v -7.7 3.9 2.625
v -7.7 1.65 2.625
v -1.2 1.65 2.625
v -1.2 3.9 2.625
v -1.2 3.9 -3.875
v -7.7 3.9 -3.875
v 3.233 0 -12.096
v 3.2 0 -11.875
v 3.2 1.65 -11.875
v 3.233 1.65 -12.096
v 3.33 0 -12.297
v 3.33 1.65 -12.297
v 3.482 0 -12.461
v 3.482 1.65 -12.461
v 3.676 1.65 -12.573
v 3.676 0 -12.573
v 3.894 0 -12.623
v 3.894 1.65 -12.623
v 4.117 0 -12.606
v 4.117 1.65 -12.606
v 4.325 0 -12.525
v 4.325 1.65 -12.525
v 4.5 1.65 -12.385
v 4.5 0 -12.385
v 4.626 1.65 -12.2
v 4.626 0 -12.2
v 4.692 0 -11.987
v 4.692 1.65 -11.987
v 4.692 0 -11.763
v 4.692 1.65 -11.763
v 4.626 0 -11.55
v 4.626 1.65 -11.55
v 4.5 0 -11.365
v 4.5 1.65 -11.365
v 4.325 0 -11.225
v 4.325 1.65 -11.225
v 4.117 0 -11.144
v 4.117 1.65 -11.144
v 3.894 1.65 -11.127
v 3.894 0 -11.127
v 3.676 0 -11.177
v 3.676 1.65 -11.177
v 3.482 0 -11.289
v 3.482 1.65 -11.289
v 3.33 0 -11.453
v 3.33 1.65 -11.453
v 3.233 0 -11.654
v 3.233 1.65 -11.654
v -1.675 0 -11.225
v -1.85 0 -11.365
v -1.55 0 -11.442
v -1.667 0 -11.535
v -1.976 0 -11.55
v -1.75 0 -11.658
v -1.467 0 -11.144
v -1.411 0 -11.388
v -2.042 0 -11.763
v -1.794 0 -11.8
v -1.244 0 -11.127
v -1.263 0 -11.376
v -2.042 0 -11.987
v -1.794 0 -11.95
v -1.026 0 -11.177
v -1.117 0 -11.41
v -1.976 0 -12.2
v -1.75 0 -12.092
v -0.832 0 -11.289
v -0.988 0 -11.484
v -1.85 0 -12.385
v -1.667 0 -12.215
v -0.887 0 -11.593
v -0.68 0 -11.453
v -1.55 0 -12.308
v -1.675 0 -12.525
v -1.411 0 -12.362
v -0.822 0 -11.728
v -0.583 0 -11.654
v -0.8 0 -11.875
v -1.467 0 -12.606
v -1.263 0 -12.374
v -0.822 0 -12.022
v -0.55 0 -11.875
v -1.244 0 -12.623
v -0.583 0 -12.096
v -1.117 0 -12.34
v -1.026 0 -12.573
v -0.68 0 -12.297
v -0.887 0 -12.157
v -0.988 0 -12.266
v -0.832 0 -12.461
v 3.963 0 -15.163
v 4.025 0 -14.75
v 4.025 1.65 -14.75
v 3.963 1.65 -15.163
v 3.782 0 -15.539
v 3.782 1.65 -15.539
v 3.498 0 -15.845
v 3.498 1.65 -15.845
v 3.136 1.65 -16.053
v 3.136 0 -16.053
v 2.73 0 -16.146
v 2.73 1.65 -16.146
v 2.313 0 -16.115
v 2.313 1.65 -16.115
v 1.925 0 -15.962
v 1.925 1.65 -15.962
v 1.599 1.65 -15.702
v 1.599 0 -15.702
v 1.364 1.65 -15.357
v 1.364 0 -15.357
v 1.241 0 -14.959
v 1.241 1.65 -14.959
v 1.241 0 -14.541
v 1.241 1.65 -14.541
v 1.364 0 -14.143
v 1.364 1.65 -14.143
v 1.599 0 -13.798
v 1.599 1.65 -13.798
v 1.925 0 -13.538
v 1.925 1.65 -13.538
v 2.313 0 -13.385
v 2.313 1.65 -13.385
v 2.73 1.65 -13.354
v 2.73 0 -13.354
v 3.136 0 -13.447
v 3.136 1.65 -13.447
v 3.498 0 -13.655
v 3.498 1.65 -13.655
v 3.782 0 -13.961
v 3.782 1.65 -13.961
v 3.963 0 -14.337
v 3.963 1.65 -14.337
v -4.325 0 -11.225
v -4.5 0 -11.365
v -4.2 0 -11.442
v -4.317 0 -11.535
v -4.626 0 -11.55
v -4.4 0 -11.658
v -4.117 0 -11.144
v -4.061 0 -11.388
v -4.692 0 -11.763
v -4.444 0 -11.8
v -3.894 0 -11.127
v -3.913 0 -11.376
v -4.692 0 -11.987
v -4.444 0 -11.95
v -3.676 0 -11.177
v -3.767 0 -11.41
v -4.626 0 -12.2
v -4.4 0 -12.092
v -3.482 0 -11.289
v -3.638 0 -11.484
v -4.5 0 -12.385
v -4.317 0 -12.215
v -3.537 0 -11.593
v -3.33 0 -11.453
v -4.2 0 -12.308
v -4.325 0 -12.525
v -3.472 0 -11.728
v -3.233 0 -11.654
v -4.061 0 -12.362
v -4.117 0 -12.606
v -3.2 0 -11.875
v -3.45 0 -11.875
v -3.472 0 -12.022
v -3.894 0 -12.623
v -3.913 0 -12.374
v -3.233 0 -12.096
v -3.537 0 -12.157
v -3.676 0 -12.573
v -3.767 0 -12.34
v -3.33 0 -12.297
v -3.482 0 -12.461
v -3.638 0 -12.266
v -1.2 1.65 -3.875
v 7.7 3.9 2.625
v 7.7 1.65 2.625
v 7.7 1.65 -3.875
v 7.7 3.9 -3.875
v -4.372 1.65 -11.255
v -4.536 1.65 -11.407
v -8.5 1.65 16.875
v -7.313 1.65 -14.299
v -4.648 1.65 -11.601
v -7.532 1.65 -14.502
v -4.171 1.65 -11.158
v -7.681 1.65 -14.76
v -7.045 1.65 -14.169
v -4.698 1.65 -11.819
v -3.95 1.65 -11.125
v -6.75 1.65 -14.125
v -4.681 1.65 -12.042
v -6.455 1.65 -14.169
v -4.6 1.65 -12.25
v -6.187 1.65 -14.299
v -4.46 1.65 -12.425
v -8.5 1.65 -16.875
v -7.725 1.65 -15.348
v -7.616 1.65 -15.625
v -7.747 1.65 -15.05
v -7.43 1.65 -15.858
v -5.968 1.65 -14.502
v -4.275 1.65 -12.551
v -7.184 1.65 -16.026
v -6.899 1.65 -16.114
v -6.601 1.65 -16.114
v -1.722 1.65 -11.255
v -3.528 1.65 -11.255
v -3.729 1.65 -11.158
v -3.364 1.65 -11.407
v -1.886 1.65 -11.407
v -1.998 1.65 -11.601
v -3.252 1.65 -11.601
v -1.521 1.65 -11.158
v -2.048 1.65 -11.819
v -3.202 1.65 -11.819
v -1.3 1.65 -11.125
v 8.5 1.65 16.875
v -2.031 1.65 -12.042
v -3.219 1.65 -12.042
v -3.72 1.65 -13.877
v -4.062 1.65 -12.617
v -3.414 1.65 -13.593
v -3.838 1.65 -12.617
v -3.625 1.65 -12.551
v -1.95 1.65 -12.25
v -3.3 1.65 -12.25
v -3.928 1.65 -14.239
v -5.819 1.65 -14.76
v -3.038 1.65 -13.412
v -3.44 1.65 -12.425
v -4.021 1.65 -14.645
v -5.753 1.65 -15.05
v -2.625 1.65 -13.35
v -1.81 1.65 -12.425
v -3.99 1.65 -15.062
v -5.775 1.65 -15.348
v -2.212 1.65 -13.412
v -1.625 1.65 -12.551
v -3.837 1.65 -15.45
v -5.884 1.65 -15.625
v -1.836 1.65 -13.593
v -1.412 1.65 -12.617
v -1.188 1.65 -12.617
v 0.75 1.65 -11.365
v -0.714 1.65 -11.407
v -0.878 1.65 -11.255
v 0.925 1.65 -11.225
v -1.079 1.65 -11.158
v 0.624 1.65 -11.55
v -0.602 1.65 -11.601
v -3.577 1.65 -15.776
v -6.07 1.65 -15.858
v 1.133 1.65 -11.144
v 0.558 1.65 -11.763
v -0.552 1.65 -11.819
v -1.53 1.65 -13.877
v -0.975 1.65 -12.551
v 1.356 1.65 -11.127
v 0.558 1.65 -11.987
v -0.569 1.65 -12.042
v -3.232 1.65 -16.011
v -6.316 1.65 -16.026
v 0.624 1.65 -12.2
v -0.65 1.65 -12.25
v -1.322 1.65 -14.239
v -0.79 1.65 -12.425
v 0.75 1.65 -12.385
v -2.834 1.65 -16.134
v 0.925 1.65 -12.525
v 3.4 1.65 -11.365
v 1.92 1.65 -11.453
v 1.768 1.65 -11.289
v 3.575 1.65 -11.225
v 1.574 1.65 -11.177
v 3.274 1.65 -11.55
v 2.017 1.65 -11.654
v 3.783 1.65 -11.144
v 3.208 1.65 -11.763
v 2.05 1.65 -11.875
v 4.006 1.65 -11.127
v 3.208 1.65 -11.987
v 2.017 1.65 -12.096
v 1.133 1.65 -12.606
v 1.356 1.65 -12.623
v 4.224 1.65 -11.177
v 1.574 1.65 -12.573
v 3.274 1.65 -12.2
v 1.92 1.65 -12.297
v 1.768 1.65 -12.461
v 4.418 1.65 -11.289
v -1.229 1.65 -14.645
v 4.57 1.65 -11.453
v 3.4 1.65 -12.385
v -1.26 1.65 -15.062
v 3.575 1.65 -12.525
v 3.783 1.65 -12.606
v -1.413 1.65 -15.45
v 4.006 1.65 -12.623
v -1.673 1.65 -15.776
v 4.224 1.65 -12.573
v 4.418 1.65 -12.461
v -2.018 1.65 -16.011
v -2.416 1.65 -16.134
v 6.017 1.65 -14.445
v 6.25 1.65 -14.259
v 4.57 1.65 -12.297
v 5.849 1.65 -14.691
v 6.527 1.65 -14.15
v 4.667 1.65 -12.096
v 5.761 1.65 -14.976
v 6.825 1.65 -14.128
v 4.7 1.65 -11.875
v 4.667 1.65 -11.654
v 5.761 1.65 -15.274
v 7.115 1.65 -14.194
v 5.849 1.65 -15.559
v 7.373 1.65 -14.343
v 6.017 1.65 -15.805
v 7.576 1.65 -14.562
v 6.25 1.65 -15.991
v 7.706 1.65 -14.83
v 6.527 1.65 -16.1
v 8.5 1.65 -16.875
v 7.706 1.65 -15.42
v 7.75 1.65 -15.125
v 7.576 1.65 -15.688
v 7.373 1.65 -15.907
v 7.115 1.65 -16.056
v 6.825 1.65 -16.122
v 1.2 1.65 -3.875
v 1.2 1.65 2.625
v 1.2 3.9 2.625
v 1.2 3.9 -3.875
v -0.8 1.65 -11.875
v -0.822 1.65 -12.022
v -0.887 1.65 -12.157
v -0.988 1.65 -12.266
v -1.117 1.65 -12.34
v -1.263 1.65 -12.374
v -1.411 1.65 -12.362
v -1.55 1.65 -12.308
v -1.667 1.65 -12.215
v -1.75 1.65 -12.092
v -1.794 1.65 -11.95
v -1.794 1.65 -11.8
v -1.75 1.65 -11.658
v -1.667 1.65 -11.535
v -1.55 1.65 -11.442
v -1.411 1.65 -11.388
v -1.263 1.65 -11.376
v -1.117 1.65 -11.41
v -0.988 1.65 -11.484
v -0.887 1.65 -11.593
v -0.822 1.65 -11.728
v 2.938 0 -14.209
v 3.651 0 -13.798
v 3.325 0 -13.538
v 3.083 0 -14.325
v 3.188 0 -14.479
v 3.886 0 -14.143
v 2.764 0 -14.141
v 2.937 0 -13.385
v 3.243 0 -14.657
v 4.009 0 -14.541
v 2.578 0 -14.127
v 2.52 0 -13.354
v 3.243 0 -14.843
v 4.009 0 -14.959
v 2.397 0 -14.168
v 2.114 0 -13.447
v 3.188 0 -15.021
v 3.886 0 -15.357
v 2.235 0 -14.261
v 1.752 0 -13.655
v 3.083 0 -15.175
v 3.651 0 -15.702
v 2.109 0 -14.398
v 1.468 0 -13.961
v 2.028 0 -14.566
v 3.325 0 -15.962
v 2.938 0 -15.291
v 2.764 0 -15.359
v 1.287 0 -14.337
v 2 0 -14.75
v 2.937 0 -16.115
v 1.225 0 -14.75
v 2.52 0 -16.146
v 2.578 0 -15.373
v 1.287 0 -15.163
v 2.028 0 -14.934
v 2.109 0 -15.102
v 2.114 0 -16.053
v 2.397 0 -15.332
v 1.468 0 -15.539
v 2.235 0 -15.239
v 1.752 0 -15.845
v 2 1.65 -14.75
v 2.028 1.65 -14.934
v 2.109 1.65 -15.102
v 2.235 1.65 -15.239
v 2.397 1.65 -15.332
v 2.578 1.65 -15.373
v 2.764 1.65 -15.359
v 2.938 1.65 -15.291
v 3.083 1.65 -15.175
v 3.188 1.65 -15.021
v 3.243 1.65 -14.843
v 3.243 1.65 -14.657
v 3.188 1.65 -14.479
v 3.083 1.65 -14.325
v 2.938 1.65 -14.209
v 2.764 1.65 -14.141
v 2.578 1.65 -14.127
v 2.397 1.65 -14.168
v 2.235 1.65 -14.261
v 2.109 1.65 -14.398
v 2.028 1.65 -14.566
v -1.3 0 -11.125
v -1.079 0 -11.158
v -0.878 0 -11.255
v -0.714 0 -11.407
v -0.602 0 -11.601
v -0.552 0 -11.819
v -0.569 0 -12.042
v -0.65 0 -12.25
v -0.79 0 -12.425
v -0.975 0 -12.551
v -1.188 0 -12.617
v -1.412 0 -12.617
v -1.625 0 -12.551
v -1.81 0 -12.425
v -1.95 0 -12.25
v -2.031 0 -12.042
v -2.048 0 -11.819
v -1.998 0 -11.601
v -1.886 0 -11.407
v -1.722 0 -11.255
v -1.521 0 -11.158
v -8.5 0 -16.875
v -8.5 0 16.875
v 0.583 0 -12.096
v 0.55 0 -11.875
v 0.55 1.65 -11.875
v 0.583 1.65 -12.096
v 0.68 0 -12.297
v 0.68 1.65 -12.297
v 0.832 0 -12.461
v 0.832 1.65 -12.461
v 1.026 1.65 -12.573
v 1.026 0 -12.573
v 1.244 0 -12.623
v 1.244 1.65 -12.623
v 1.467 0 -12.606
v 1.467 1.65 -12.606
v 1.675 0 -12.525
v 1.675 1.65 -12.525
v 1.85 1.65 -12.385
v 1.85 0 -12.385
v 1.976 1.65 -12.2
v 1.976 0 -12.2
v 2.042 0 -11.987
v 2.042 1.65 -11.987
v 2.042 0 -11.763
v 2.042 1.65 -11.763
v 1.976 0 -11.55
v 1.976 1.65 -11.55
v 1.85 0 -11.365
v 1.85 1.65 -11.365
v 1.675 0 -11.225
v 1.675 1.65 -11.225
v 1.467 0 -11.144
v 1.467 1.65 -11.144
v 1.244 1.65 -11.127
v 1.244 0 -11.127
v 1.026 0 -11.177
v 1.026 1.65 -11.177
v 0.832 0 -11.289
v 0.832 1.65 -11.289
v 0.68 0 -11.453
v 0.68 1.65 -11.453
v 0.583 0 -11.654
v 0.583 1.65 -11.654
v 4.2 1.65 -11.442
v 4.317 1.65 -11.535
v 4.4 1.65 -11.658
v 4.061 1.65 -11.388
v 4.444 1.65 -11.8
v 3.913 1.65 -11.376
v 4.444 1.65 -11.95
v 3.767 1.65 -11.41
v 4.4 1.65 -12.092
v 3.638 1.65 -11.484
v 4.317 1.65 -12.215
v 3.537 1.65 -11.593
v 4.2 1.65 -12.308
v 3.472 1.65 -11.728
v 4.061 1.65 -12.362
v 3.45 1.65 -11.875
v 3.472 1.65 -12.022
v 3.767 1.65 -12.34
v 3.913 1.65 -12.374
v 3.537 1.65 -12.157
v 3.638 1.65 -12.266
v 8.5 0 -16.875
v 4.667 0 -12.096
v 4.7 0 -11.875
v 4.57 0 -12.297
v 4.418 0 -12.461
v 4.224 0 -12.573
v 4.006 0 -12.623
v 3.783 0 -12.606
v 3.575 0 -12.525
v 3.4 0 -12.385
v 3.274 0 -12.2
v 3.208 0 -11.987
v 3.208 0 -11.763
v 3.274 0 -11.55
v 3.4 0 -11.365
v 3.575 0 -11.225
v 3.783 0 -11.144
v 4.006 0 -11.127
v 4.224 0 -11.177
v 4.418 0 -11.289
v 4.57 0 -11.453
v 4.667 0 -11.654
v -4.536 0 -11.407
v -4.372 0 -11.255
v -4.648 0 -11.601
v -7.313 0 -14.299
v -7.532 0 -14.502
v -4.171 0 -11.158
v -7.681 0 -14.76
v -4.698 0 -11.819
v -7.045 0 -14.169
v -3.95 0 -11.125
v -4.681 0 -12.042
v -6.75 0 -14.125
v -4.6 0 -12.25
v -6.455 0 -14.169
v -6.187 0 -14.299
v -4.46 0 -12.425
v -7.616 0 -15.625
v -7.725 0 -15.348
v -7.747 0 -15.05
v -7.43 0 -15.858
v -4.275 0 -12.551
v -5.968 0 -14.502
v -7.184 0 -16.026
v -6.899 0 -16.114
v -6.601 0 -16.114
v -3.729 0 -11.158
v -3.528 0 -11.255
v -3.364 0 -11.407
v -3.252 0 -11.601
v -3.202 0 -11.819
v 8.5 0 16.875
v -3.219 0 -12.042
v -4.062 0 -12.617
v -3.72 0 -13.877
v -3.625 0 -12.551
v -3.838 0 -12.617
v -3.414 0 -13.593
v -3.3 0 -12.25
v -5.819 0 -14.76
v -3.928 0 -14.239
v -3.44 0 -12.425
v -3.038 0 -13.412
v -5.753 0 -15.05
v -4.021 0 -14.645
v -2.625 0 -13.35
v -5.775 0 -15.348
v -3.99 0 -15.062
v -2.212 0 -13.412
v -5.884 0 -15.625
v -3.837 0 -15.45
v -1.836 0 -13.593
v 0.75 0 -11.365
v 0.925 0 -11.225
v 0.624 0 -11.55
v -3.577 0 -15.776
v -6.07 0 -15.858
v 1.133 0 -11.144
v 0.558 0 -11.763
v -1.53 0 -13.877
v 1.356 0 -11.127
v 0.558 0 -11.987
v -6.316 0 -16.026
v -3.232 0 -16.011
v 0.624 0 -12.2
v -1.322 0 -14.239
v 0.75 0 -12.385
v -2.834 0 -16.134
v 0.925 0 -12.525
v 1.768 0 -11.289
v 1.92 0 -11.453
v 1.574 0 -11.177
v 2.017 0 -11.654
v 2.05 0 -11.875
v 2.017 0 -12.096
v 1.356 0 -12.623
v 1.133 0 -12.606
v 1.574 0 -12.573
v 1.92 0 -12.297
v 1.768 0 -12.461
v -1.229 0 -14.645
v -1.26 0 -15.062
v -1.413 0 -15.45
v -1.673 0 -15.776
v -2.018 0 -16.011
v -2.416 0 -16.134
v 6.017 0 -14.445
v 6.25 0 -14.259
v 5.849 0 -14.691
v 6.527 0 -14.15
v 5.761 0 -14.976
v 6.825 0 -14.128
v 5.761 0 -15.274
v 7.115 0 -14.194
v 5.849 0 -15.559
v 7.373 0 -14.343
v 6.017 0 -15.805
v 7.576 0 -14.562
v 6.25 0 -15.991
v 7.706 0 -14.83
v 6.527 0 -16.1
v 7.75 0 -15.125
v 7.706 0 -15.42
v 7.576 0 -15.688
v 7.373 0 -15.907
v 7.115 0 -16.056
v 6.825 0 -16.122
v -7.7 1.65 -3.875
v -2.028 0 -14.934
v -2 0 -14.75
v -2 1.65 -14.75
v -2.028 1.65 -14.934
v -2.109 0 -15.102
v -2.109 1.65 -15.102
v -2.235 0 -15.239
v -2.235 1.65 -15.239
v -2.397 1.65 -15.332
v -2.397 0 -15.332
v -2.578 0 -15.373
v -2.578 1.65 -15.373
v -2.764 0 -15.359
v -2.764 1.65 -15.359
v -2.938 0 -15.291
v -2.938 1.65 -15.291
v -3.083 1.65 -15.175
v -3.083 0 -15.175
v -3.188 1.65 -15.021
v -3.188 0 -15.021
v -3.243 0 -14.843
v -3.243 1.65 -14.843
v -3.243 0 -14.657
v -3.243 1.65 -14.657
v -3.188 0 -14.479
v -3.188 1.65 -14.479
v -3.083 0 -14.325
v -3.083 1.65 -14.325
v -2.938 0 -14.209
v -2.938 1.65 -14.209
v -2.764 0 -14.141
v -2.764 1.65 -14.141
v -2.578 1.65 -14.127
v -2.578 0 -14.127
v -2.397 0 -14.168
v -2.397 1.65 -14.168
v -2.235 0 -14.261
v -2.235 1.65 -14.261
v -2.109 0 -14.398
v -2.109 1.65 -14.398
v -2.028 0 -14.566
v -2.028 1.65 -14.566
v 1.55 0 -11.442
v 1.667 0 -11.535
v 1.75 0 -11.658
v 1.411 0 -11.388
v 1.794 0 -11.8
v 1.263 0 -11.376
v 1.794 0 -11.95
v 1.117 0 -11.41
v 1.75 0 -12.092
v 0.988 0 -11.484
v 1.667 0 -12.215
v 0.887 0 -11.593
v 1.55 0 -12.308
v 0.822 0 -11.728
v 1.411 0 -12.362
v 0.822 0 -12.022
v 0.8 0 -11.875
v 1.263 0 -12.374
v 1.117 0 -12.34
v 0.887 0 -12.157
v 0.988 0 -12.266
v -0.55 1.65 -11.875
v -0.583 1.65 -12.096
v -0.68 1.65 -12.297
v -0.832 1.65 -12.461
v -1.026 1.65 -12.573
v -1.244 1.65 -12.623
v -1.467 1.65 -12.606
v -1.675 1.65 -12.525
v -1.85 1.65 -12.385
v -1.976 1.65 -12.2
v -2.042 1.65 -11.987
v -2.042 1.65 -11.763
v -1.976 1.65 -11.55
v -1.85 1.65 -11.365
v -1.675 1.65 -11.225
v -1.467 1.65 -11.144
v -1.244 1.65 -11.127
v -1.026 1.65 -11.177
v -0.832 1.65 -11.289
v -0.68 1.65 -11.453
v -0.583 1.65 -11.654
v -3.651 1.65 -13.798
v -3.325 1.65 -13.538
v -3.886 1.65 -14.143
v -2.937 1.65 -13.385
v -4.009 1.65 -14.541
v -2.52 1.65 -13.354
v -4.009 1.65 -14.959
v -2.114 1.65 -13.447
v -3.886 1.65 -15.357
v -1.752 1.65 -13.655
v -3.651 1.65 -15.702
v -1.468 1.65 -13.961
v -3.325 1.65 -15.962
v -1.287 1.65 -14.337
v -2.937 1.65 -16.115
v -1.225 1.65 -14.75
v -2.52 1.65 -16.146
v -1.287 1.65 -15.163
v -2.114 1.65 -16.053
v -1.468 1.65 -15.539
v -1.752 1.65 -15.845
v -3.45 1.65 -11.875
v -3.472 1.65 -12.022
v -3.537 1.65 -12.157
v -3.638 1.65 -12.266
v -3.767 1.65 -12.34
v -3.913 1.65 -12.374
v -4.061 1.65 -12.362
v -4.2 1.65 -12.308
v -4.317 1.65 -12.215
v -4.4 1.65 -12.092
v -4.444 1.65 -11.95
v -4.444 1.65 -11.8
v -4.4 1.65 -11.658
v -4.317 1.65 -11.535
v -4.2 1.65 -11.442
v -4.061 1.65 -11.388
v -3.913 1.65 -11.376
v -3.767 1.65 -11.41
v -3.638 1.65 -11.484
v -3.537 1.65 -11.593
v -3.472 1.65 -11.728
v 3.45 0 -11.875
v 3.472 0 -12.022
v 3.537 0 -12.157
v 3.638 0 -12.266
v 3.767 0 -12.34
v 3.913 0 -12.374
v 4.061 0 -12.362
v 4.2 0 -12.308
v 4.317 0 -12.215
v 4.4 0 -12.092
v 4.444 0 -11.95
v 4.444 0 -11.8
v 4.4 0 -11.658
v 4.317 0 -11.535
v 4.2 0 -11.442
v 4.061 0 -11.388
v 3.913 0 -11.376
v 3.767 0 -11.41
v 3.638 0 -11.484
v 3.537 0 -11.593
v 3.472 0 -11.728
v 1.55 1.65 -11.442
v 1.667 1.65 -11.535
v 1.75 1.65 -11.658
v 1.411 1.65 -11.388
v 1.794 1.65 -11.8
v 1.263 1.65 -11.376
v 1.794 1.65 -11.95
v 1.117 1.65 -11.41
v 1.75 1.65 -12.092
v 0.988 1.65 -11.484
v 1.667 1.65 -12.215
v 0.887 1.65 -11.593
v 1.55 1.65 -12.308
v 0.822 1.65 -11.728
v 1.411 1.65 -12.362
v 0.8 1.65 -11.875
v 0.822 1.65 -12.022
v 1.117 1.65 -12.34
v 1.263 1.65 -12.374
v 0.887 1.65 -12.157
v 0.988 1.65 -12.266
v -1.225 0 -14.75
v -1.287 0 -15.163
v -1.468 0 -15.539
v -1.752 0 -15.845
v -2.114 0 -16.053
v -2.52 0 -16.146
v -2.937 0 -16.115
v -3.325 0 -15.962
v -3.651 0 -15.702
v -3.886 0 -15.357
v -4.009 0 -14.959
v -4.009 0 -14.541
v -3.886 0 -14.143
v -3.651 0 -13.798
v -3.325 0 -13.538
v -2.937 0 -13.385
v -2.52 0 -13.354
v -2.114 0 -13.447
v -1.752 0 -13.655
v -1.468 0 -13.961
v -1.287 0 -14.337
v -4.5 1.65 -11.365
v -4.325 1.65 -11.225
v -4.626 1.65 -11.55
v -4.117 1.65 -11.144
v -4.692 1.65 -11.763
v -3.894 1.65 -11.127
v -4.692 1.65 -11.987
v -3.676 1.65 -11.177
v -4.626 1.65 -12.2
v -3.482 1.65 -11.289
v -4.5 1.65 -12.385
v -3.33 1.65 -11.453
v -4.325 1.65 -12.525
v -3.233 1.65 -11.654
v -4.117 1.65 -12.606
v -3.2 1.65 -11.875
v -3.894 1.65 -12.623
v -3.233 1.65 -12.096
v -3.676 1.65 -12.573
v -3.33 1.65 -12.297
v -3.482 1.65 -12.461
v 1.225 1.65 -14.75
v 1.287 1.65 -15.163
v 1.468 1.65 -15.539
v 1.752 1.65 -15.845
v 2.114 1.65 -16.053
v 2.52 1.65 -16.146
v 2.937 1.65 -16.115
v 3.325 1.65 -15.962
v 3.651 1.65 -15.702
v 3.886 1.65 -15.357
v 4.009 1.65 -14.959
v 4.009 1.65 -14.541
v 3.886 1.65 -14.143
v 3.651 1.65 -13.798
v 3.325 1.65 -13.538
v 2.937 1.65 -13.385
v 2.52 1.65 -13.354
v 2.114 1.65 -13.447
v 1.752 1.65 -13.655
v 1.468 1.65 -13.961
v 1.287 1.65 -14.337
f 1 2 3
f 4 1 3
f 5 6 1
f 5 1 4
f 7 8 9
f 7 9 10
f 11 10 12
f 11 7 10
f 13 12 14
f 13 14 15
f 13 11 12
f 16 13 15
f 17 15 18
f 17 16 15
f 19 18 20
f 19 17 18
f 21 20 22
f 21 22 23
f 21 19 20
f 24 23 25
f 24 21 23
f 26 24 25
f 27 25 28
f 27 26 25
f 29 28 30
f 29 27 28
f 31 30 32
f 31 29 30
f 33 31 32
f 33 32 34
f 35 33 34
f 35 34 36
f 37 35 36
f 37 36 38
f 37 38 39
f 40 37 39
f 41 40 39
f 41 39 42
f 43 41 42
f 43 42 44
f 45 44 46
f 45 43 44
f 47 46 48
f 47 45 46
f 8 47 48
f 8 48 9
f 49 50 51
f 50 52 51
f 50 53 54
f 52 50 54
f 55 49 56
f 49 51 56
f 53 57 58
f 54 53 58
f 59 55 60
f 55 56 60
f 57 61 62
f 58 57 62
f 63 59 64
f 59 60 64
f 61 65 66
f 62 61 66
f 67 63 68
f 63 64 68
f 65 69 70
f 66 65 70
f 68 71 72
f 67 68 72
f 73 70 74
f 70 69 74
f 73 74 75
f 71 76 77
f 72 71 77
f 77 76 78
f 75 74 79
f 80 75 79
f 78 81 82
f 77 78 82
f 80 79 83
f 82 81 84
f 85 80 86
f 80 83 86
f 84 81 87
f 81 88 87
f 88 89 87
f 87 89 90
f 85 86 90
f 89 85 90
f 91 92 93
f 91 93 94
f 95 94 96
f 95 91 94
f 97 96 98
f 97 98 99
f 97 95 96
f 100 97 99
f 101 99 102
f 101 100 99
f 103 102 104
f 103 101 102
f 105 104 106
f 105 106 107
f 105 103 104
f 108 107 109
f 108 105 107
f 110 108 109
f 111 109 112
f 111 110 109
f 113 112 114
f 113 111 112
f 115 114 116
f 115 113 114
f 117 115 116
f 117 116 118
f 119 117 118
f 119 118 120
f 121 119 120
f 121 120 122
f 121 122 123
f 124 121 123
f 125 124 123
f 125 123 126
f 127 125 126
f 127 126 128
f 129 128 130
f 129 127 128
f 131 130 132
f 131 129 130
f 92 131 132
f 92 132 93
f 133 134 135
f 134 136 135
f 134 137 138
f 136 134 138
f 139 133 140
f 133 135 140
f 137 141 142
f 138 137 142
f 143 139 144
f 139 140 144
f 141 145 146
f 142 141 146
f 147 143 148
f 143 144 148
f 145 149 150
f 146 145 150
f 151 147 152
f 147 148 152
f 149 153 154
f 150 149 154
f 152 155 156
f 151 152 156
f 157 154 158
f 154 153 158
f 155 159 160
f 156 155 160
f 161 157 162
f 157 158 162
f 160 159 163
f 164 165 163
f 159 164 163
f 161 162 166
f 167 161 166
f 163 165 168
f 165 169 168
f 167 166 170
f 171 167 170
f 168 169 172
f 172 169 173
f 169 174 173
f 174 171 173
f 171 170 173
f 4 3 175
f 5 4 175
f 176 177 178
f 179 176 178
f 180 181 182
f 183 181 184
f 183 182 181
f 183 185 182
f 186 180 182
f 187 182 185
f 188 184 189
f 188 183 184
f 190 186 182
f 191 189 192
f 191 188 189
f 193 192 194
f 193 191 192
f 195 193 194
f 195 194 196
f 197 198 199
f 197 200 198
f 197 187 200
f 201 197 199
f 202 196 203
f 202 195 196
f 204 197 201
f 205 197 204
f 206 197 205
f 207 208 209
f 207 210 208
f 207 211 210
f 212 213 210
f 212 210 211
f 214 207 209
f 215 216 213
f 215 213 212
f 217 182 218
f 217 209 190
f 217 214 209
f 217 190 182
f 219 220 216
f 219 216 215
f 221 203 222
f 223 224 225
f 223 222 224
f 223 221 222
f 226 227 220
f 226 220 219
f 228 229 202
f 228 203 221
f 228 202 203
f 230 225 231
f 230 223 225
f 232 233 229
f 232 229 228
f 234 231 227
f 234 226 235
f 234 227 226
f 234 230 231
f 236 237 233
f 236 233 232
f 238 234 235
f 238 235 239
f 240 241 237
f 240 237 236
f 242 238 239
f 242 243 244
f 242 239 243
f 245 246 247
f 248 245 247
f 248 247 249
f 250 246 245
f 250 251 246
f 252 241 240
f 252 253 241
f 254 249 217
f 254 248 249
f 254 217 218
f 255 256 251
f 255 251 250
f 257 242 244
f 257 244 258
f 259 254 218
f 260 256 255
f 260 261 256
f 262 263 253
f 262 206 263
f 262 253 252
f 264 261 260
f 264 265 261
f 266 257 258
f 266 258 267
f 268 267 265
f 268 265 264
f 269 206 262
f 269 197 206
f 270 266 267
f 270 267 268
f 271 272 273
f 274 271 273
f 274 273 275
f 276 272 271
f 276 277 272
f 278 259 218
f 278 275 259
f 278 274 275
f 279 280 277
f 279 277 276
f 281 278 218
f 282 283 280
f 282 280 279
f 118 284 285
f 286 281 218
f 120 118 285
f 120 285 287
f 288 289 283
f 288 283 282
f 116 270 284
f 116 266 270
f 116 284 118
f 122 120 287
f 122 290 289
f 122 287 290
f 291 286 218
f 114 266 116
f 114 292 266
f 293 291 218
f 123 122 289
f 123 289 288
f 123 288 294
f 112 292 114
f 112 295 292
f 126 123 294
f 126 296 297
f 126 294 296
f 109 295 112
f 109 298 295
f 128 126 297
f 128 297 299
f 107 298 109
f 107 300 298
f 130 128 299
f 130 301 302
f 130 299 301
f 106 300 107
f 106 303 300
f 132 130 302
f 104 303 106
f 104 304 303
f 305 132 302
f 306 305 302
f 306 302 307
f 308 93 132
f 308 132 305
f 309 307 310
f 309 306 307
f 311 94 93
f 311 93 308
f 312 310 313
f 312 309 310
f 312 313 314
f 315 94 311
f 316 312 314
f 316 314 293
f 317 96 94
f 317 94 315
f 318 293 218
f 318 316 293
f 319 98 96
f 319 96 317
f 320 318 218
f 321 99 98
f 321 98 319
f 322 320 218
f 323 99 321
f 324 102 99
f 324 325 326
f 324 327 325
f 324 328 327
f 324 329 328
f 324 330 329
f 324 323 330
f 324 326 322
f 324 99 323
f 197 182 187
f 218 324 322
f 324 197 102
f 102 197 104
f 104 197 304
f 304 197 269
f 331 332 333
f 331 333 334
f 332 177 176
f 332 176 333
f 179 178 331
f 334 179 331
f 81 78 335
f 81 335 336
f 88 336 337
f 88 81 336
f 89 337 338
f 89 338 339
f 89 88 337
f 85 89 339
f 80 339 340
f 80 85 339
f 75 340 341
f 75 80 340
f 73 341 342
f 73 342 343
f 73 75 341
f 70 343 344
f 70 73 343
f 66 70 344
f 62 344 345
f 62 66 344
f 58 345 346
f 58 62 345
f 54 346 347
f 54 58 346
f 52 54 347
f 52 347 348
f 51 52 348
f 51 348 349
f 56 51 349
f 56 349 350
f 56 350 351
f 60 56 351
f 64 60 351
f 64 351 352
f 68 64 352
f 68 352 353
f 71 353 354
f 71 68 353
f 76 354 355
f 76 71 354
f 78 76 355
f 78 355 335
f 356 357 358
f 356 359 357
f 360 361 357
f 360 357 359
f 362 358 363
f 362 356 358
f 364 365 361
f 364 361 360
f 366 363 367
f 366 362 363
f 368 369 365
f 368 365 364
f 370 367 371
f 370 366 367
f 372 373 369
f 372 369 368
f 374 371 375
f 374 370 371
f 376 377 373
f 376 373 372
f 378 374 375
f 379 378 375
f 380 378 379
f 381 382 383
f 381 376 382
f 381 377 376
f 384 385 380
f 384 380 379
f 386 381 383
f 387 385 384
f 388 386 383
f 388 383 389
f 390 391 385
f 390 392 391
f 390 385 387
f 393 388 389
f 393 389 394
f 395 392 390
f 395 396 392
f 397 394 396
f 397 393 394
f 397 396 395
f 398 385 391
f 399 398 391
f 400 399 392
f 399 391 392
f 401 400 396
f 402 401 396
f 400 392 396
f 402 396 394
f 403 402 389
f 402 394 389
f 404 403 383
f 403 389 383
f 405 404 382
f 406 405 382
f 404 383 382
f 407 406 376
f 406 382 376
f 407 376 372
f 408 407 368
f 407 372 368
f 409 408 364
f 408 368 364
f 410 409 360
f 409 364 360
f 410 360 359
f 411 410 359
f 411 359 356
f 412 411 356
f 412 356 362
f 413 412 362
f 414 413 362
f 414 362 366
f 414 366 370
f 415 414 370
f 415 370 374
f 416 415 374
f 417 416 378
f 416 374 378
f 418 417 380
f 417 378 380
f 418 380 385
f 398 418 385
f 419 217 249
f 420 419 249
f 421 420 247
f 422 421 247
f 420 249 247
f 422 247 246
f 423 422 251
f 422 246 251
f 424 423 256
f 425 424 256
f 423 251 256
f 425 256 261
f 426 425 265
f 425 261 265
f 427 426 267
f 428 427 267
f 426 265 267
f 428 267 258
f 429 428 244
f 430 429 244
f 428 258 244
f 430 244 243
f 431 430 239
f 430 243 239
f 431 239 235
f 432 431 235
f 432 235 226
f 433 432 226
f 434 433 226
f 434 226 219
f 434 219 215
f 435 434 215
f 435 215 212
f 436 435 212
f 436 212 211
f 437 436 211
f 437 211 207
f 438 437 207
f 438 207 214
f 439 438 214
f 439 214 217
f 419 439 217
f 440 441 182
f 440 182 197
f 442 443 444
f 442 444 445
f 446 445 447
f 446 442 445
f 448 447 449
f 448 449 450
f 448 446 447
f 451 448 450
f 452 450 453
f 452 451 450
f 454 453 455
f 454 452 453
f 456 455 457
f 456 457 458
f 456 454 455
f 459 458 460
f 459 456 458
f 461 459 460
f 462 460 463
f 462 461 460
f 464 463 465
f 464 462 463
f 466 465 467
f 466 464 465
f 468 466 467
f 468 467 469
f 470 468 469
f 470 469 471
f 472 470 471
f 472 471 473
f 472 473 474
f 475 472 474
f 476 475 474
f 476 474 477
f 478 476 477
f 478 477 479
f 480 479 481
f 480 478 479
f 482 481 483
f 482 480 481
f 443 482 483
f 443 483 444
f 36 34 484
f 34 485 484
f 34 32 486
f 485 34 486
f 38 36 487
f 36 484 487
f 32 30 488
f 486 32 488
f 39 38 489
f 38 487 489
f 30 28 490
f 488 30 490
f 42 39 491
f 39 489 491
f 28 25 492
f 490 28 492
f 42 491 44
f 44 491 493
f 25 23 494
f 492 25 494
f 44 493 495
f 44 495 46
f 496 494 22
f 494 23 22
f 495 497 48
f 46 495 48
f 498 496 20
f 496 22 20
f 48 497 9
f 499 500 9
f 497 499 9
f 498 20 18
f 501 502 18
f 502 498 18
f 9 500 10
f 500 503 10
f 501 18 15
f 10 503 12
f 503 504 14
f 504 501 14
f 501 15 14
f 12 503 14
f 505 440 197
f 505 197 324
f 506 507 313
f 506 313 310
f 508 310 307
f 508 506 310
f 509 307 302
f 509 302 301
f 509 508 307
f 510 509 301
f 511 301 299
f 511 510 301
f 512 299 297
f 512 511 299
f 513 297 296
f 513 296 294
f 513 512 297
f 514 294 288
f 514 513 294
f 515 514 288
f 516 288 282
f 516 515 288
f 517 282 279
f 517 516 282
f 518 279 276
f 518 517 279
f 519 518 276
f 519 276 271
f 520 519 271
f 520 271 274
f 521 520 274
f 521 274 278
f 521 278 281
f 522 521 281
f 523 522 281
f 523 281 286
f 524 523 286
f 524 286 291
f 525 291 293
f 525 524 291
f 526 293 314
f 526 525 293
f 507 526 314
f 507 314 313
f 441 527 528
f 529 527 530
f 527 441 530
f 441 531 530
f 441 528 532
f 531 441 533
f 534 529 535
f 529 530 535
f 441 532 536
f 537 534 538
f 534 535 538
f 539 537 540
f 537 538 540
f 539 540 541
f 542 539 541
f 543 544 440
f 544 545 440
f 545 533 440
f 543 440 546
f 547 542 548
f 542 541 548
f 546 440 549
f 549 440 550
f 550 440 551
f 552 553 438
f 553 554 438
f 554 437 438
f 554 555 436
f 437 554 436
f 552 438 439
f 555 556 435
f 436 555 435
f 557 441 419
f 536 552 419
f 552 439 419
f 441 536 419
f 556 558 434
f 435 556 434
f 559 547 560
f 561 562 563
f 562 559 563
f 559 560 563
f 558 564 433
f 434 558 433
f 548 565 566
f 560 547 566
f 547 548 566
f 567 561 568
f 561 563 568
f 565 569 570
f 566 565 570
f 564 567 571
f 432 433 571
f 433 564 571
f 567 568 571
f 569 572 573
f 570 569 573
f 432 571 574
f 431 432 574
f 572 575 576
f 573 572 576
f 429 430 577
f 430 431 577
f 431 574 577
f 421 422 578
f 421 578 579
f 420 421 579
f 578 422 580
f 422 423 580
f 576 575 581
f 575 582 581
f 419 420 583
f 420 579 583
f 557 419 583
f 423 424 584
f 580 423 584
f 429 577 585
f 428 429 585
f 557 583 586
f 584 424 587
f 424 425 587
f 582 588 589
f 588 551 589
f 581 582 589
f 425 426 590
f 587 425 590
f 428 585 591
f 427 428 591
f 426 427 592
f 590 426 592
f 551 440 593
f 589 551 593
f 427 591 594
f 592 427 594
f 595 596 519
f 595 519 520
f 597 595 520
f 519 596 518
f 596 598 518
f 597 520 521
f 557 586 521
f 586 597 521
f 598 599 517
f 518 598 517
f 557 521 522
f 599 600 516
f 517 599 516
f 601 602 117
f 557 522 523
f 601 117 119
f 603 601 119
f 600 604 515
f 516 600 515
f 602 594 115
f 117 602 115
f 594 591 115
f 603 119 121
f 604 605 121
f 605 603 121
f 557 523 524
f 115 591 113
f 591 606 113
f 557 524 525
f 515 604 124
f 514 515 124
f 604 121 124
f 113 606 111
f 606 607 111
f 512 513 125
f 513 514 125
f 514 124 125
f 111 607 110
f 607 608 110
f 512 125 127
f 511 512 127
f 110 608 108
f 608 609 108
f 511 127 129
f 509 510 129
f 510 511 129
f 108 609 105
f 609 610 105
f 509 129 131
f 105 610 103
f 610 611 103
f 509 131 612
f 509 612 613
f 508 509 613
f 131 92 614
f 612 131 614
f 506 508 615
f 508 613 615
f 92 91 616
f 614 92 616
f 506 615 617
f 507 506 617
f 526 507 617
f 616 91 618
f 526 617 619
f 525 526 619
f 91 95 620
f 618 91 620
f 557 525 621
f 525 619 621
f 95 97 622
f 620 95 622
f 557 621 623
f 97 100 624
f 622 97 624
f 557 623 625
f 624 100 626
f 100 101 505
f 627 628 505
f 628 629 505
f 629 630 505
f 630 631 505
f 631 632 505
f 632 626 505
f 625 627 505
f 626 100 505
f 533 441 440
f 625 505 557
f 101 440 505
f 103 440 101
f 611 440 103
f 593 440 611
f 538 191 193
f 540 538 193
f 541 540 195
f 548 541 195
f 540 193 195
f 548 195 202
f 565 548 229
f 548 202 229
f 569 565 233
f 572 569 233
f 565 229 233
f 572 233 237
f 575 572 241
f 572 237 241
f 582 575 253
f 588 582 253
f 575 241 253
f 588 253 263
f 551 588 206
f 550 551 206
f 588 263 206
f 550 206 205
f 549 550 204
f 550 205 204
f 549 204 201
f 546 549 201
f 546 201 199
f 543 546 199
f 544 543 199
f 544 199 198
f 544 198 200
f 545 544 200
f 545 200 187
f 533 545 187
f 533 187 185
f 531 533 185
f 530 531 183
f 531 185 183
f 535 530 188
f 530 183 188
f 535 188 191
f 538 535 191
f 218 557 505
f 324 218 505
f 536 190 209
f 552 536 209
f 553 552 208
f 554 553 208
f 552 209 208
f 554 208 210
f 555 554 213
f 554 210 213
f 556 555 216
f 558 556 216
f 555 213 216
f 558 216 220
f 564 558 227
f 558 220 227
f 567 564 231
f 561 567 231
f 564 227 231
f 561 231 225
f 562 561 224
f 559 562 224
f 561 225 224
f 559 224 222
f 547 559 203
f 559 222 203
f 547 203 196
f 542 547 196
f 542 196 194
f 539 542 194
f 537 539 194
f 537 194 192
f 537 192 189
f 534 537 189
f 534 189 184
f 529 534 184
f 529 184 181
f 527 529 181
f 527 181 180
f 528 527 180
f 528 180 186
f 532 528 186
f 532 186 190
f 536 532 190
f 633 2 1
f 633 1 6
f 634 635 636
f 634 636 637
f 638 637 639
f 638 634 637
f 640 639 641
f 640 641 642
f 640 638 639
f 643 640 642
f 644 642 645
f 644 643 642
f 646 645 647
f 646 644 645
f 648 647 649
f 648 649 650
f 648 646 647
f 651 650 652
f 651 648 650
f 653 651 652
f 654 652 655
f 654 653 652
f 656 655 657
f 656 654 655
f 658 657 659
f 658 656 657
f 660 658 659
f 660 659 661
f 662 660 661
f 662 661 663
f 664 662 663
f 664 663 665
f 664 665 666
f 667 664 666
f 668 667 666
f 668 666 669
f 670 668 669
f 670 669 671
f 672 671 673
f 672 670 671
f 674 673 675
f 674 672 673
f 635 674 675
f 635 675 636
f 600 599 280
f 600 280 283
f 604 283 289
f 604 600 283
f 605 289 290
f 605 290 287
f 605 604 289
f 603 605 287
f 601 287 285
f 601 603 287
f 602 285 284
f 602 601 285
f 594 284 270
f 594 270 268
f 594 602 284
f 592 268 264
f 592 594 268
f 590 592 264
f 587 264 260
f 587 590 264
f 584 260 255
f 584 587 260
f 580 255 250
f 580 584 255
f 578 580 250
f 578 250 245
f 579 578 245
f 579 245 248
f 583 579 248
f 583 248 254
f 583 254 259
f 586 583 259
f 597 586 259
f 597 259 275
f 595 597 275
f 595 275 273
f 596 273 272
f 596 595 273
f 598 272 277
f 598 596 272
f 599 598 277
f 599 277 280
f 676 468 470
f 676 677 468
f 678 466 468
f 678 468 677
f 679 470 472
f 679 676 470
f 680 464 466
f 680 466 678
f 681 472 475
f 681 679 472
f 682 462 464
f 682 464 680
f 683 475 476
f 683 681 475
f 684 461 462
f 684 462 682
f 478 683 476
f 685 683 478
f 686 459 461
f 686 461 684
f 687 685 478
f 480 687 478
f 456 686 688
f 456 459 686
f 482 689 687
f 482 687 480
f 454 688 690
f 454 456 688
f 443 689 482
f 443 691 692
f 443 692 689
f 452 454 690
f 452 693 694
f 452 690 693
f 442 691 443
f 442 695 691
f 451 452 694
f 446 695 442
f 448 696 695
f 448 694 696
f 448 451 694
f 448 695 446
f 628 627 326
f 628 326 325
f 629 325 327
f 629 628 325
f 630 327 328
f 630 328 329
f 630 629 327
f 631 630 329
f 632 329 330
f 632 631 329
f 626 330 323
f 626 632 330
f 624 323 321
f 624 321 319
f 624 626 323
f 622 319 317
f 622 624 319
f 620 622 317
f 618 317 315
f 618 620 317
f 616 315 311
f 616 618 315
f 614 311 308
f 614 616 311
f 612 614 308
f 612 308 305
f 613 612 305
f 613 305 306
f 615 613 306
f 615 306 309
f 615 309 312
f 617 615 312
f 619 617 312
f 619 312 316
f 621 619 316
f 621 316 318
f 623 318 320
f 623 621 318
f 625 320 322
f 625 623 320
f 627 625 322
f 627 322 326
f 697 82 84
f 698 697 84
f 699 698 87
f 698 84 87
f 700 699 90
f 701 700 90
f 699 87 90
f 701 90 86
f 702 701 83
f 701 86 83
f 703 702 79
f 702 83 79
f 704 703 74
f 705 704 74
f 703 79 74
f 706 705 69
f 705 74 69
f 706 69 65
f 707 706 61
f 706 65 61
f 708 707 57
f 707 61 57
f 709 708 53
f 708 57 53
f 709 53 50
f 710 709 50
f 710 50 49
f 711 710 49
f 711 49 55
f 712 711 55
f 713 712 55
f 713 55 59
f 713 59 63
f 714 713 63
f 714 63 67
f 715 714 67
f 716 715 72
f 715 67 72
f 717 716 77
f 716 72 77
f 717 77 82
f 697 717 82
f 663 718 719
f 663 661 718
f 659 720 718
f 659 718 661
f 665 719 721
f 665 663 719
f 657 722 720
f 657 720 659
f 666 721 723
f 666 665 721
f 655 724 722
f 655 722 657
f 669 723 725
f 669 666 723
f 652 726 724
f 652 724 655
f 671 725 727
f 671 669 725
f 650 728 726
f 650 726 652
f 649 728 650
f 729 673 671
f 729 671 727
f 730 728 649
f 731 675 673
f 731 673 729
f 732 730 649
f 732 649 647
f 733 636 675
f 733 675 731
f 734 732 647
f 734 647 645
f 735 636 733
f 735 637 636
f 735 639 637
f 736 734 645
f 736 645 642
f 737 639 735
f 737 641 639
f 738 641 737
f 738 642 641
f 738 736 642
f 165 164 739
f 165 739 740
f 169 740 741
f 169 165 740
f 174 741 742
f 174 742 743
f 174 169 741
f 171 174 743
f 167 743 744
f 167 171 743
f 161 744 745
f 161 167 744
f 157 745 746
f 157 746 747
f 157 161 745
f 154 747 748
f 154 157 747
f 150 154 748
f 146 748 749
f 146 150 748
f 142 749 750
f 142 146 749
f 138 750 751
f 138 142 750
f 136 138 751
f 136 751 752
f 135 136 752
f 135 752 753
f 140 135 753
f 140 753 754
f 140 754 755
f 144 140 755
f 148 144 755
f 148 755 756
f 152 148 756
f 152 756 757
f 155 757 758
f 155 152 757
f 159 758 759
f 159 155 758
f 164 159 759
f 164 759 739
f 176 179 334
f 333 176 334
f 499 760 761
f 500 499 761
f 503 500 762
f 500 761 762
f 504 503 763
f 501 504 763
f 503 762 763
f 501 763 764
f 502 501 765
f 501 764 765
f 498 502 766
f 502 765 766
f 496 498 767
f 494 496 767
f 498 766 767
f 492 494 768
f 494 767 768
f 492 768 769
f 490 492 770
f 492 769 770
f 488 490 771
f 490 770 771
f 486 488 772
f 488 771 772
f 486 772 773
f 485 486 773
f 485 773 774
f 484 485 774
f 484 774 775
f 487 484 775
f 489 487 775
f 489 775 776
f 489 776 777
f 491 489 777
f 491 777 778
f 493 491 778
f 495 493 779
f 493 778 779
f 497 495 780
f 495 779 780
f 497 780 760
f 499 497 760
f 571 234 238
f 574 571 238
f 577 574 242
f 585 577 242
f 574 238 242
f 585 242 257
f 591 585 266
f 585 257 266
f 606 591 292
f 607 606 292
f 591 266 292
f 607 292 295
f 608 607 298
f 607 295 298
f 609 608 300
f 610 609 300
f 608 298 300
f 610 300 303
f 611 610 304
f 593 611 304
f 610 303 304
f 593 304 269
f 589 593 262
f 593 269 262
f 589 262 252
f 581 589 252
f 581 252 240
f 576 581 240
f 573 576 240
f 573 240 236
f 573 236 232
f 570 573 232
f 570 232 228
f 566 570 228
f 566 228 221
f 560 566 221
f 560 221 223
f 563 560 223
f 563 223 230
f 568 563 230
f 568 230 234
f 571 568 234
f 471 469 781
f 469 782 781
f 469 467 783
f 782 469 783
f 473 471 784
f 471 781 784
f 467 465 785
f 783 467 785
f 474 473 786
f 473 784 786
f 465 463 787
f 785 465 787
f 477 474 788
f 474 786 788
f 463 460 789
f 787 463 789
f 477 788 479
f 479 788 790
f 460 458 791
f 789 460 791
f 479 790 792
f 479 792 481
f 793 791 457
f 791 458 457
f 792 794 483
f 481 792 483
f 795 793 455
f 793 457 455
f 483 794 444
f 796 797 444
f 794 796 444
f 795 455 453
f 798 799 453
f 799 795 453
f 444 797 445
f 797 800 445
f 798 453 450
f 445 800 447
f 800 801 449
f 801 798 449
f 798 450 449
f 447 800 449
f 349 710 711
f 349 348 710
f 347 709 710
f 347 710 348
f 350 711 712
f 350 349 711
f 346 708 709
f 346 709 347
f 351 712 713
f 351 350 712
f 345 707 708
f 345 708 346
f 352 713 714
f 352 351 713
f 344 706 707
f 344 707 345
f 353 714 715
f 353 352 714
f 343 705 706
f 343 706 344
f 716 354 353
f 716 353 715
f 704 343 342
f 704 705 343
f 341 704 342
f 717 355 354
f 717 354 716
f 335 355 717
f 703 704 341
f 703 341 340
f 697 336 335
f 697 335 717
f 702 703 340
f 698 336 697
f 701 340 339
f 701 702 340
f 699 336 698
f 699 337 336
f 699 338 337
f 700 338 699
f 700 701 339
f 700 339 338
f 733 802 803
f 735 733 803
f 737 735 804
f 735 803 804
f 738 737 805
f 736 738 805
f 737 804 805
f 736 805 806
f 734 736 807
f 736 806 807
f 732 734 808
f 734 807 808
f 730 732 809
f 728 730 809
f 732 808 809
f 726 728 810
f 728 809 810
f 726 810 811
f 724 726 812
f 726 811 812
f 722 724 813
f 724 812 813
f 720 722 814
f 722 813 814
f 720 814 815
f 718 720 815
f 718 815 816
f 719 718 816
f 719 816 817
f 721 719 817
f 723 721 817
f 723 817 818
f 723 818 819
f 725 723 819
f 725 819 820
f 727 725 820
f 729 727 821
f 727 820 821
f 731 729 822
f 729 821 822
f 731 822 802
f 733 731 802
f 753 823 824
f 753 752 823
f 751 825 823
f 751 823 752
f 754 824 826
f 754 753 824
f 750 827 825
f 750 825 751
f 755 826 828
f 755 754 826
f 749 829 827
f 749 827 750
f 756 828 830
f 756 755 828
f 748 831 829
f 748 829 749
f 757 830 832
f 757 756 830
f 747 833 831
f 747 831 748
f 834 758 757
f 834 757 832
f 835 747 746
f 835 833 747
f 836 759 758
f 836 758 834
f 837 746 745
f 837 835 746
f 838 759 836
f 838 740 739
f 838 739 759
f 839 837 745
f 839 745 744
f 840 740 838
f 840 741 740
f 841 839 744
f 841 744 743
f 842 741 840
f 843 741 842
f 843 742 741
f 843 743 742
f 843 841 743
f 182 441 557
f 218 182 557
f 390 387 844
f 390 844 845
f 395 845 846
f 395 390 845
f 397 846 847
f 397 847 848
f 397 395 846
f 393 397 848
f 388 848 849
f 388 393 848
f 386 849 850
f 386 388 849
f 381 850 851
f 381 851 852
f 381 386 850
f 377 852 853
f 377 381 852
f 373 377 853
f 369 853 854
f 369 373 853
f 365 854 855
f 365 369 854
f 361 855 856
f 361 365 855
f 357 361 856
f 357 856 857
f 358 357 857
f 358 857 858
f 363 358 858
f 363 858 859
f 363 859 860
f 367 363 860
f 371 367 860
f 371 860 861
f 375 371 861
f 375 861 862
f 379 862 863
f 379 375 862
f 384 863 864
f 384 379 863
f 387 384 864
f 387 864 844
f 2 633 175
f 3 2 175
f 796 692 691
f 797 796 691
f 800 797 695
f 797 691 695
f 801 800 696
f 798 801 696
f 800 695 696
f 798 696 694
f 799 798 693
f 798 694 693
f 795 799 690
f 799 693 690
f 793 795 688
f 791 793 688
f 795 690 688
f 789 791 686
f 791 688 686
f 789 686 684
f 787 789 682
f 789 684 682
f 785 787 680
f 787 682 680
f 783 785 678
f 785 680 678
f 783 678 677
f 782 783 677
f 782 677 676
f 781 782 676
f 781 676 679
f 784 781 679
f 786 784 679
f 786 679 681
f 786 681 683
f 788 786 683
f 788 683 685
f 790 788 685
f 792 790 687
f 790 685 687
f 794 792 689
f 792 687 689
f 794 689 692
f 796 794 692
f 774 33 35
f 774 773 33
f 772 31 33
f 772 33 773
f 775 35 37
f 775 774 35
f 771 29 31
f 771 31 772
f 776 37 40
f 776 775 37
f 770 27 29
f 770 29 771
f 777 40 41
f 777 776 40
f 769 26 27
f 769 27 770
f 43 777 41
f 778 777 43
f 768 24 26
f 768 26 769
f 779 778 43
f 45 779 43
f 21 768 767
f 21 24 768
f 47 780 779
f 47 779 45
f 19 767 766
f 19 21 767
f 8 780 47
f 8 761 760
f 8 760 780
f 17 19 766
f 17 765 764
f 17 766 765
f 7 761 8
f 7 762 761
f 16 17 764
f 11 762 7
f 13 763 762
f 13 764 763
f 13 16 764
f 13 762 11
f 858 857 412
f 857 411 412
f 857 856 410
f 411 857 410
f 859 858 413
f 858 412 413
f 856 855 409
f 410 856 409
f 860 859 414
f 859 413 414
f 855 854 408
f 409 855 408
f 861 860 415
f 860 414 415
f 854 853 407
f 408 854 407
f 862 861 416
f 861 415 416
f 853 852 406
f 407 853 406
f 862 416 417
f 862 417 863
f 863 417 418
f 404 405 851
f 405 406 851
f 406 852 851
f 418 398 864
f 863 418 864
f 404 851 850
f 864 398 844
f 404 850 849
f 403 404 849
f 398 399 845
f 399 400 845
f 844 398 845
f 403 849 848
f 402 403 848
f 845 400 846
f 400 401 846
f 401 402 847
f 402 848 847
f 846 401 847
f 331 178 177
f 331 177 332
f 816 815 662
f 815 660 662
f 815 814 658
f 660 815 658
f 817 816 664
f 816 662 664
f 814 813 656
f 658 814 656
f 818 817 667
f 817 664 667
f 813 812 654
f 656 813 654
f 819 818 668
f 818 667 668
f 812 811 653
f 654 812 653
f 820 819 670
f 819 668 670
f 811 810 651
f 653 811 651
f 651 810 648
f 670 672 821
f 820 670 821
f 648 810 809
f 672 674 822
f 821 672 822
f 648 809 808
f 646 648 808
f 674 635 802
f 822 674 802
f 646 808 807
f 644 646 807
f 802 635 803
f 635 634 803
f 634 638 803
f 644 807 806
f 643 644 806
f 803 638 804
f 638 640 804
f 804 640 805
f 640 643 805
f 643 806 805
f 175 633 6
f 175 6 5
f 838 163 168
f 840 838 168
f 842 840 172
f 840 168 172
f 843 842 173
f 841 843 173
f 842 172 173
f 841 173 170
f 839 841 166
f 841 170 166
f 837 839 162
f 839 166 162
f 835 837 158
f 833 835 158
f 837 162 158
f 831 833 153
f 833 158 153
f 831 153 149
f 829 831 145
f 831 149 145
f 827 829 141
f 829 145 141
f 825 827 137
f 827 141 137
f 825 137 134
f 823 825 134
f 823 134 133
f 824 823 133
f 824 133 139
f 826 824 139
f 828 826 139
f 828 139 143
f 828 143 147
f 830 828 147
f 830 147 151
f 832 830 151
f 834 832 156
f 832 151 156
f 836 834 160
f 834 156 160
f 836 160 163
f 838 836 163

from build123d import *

# Parameters (mm, degrees)
PCB_SKETCH_W                     = 17
PCB_SKETCH_H                     = 33.75
PCB_EXTRUDE_DEPTH                = 1.65
THROUGH_HOLE_SKETCH_R            = 1.4
THROUGH_HOLE_SKETCH_R_2          = 0.625
THROUGH_HOLE_SKETCH_R_3          = 0.75
THROUGH_HOLE_SKETCH_R_4          = 0.5
THROUGH_HOLE_CUT_DEPTH           = 19.966763693
MOUNTING_HOLES_SKETCH_R          = 1
MOUNTING_HOLE_CUT_DEPTH          = 1.65
HOLES_MIRROR_OUTLINE_R           = 1.4
HOLES_MIRROR_OUTLINE_R_2         = 0.75
HOLES_MIRROR_OUTLINE_R_3         = 1
HOLES_MIRROR_DEPTH               = 1.65
THROUGH_HOLE_EXTRUDE_OUTLINE_R   = 0.75
THROUGH_HOLE_EXTRUDE_OUTLINE_R_2 = 0.5
THROUGH_HOLE_EXTRUDE_OUTLINE_R_3 = 1.4
THROUGH_HOLE_EXTRUDE_OUTLINE_R_4 = 0.625
THROUGH_HOLE_EXTRUDE_DEPTH       = 1.65
MOSFET_SKETCH_W                  = 6.5
MOSFET_SKETCH_H                  = 6.5
MOSFET_EXTRUDE_DEPTH             = 2.25


# Read off the part's stored shape, not the designer's step: Holes Mirror, Through Hole Extrude
with BuildPart() as part:
    # PCB Sketch → PCB Extrude (new body)
    with BuildSketch(Plane(origin=(0, 0, 0), x_dir=(1, 0, 0), z_dir=(0, 1, 0))):
        Rectangle(PCB_SKETCH_W, PCB_SKETCH_H)
    extrude(amount=PCB_EXTRUDE_DEPTH)

    # Through Hole Sketch → Through Hole Cut (cut, through all)
    # profile 1 of 4: a face of its own
    with BuildSketch(Plane(origin=(0, 1.65, 0), x_dir=(1, 0, 0), z_dir=(0, 1, 0))):
        with Locations(Location((-2.625, 14.75, 0), (0, 0, 270))):
            Circle(THROUGH_HOLE_SKETCH_R)
        with Locations((-2.625, 14.75)):
            Circle(THROUGH_HOLE_SKETCH_R_2, mode=Mode.SUBTRACT)
    # profile 2 of 4: a face of its own
    with BuildSketch(Plane(origin=(0, 1.65, 0), x_dir=(1, 0, 0), z_dir=(0, 1, 0))):
        with Locations((-2.625, 14.75)):
            Circle(THROUGH_HOLE_SKETCH_R_2)
    # profile 3 of 4: a face of its own
    with BuildSketch(Plane(origin=(0, 1.65, 0), x_dir=(1, 0, 0), z_dir=(0, 1, 0))):
        with Locations(Location((-1.3, 11.875, 0), (0, 0, 270))):
            Circle(THROUGH_HOLE_SKETCH_R_3)
        with Locations((-1.3, 11.875)):
            Circle(THROUGH_HOLE_SKETCH_R_4, mode=Mode.SUBTRACT)
    # profile 4 of 4: a face of its own
    with BuildSketch(Plane(origin=(0, 1.65, 0), x_dir=(1, 0, 0), z_dir=(0, 1, 0))):
        with Locations(Location((-3.95, 11.875, 0), (0, 0, 270))):
            Circle(THROUGH_HOLE_SKETCH_R_3)
    extrude(amount=-THROUGH_HOLE_CUT_DEPTH, mode=Mode.SUBTRACT)


with BuildPart() as through_hole_cut_kept_piece:
    # of the separate pieces the step leaves, the one the design keeps (through_hole_cut_pieces_kept)
    add(part.part.solids().sort_by_distance((-8.5, 0, 16.875))[0])

    # Mounting Holes Sketch → Mounting Hole Cut (cut)
    with BuildSketch(Plane(origin=(0, 1.65, 0), x_dir=(1, 0, 0), z_dir=(0, 1, 0))):
        with Locations(Location((-6.75, 15.125, 0), (0, 0, 270))):
            Circle(MOUNTING_HOLES_SKETCH_R)
    extrude(amount=-MOUNTING_HOLE_CUT_DEPTH, mode=Mode.SUBTRACT)

    # Holes Mirror outline → Holes Mirror (cut)
    with BuildSketch(Plane(origin=(0, 0, 0), x_dir=(1, 0, 0), z_dir=(0, 1, 0))):
        with Locations((2.625, 14.75)):
            Circle(HOLES_MIRROR_OUTLINE_R)
        with Locations((1.3, 11.875)):
            Circle(HOLES_MIRROR_OUTLINE_R_2)
        with Locations((3.95, 11.875)):
            Circle(HOLES_MIRROR_OUTLINE_R_2)
        with Locations((6.75, 15.125)):
            Circle(HOLES_MIRROR_OUTLINE_R_3)
    extrude(amount=HOLES_MIRROR_DEPTH, mode=Mode.SUBTRACT)


with BuildPart() as body_2:
    # Through Hole Extrude outline → Through Hole Extrude (new body)
    # profile 1 of 3: a face of its own
    with BuildSketch(Plane(origin=(0, 0, 0), x_dir=(1, 0, 0), z_dir=(0, 1, 0))):
        with Locations((-3.95, 11.875)):
            Circle(THROUGH_HOLE_EXTRUDE_OUTLINE_R)
        with Locations((-3.95, 11.875)):
            Circle(THROUGH_HOLE_EXTRUDE_OUTLINE_R_2, mode=Mode.SUBTRACT)
    # profile 2 of 3: a face of its own
    with BuildSketch(Plane(origin=(0, 0, 0), x_dir=(1, 0, 0), z_dir=(0, 1, 0))):
        with Locations((-1.3, 11.875)):
            Circle(THROUGH_HOLE_EXTRUDE_OUTLINE_R)
        with Locations((-1.3, 11.875)):
            Circle(THROUGH_HOLE_EXTRUDE_OUTLINE_R_2, mode=Mode.SUBTRACT)
    # profile 3 of 3: a face of its own
    with BuildSketch(Plane(origin=(0, 0, 0), x_dir=(1, 0, 0), z_dir=(0, 1, 0))):
        with Locations((-2.625, 14.75)):
            Circle(THROUGH_HOLE_EXTRUDE_OUTLINE_R_3)
        with Locations((-2.625, 14.75)):
            Circle(THROUGH_HOLE_EXTRUDE_OUTLINE_R_4, mode=Mode.SUBTRACT)
    extrude(amount=THROUGH_HOLE_EXTRUDE_DEPTH)


with BuildPart() as body_3:
    # Mosfet Sketch → Mosfet Extrude (new body)
    with BuildSketch(Plane(origin=(0, 1.65, 0), x_dir=(1, 0, 0), z_dir=(0, 1, 0))):
        with Locations((-4.45, 0.625)):
            Rectangle(MOSFET_SKETCH_W, MOSFET_SKETCH_H)
    extrude(amount=MOSFET_EXTRUDE_DEPTH)


with BuildPart() as body_4:
    # Bodies Mirror: mirrored copy
    add(body_2.part.mirror(Plane(origin=(0, 0, 0), x_dir=(0, 0, 1), z_dir=(1, 0, 0))))


with BuildPart() as body_5:
    # Bodies Mirror 2: mirrored copy
    add(body_3.part.mirror(Plane(origin=(0, 0, 0), x_dir=(0, 0, 1), z_dir=(1, 0, 0))))


solid = Compound([through_hole_cut_kept_piece.part, body_2.part, body_3.part, body_4.part, body_5.part])
